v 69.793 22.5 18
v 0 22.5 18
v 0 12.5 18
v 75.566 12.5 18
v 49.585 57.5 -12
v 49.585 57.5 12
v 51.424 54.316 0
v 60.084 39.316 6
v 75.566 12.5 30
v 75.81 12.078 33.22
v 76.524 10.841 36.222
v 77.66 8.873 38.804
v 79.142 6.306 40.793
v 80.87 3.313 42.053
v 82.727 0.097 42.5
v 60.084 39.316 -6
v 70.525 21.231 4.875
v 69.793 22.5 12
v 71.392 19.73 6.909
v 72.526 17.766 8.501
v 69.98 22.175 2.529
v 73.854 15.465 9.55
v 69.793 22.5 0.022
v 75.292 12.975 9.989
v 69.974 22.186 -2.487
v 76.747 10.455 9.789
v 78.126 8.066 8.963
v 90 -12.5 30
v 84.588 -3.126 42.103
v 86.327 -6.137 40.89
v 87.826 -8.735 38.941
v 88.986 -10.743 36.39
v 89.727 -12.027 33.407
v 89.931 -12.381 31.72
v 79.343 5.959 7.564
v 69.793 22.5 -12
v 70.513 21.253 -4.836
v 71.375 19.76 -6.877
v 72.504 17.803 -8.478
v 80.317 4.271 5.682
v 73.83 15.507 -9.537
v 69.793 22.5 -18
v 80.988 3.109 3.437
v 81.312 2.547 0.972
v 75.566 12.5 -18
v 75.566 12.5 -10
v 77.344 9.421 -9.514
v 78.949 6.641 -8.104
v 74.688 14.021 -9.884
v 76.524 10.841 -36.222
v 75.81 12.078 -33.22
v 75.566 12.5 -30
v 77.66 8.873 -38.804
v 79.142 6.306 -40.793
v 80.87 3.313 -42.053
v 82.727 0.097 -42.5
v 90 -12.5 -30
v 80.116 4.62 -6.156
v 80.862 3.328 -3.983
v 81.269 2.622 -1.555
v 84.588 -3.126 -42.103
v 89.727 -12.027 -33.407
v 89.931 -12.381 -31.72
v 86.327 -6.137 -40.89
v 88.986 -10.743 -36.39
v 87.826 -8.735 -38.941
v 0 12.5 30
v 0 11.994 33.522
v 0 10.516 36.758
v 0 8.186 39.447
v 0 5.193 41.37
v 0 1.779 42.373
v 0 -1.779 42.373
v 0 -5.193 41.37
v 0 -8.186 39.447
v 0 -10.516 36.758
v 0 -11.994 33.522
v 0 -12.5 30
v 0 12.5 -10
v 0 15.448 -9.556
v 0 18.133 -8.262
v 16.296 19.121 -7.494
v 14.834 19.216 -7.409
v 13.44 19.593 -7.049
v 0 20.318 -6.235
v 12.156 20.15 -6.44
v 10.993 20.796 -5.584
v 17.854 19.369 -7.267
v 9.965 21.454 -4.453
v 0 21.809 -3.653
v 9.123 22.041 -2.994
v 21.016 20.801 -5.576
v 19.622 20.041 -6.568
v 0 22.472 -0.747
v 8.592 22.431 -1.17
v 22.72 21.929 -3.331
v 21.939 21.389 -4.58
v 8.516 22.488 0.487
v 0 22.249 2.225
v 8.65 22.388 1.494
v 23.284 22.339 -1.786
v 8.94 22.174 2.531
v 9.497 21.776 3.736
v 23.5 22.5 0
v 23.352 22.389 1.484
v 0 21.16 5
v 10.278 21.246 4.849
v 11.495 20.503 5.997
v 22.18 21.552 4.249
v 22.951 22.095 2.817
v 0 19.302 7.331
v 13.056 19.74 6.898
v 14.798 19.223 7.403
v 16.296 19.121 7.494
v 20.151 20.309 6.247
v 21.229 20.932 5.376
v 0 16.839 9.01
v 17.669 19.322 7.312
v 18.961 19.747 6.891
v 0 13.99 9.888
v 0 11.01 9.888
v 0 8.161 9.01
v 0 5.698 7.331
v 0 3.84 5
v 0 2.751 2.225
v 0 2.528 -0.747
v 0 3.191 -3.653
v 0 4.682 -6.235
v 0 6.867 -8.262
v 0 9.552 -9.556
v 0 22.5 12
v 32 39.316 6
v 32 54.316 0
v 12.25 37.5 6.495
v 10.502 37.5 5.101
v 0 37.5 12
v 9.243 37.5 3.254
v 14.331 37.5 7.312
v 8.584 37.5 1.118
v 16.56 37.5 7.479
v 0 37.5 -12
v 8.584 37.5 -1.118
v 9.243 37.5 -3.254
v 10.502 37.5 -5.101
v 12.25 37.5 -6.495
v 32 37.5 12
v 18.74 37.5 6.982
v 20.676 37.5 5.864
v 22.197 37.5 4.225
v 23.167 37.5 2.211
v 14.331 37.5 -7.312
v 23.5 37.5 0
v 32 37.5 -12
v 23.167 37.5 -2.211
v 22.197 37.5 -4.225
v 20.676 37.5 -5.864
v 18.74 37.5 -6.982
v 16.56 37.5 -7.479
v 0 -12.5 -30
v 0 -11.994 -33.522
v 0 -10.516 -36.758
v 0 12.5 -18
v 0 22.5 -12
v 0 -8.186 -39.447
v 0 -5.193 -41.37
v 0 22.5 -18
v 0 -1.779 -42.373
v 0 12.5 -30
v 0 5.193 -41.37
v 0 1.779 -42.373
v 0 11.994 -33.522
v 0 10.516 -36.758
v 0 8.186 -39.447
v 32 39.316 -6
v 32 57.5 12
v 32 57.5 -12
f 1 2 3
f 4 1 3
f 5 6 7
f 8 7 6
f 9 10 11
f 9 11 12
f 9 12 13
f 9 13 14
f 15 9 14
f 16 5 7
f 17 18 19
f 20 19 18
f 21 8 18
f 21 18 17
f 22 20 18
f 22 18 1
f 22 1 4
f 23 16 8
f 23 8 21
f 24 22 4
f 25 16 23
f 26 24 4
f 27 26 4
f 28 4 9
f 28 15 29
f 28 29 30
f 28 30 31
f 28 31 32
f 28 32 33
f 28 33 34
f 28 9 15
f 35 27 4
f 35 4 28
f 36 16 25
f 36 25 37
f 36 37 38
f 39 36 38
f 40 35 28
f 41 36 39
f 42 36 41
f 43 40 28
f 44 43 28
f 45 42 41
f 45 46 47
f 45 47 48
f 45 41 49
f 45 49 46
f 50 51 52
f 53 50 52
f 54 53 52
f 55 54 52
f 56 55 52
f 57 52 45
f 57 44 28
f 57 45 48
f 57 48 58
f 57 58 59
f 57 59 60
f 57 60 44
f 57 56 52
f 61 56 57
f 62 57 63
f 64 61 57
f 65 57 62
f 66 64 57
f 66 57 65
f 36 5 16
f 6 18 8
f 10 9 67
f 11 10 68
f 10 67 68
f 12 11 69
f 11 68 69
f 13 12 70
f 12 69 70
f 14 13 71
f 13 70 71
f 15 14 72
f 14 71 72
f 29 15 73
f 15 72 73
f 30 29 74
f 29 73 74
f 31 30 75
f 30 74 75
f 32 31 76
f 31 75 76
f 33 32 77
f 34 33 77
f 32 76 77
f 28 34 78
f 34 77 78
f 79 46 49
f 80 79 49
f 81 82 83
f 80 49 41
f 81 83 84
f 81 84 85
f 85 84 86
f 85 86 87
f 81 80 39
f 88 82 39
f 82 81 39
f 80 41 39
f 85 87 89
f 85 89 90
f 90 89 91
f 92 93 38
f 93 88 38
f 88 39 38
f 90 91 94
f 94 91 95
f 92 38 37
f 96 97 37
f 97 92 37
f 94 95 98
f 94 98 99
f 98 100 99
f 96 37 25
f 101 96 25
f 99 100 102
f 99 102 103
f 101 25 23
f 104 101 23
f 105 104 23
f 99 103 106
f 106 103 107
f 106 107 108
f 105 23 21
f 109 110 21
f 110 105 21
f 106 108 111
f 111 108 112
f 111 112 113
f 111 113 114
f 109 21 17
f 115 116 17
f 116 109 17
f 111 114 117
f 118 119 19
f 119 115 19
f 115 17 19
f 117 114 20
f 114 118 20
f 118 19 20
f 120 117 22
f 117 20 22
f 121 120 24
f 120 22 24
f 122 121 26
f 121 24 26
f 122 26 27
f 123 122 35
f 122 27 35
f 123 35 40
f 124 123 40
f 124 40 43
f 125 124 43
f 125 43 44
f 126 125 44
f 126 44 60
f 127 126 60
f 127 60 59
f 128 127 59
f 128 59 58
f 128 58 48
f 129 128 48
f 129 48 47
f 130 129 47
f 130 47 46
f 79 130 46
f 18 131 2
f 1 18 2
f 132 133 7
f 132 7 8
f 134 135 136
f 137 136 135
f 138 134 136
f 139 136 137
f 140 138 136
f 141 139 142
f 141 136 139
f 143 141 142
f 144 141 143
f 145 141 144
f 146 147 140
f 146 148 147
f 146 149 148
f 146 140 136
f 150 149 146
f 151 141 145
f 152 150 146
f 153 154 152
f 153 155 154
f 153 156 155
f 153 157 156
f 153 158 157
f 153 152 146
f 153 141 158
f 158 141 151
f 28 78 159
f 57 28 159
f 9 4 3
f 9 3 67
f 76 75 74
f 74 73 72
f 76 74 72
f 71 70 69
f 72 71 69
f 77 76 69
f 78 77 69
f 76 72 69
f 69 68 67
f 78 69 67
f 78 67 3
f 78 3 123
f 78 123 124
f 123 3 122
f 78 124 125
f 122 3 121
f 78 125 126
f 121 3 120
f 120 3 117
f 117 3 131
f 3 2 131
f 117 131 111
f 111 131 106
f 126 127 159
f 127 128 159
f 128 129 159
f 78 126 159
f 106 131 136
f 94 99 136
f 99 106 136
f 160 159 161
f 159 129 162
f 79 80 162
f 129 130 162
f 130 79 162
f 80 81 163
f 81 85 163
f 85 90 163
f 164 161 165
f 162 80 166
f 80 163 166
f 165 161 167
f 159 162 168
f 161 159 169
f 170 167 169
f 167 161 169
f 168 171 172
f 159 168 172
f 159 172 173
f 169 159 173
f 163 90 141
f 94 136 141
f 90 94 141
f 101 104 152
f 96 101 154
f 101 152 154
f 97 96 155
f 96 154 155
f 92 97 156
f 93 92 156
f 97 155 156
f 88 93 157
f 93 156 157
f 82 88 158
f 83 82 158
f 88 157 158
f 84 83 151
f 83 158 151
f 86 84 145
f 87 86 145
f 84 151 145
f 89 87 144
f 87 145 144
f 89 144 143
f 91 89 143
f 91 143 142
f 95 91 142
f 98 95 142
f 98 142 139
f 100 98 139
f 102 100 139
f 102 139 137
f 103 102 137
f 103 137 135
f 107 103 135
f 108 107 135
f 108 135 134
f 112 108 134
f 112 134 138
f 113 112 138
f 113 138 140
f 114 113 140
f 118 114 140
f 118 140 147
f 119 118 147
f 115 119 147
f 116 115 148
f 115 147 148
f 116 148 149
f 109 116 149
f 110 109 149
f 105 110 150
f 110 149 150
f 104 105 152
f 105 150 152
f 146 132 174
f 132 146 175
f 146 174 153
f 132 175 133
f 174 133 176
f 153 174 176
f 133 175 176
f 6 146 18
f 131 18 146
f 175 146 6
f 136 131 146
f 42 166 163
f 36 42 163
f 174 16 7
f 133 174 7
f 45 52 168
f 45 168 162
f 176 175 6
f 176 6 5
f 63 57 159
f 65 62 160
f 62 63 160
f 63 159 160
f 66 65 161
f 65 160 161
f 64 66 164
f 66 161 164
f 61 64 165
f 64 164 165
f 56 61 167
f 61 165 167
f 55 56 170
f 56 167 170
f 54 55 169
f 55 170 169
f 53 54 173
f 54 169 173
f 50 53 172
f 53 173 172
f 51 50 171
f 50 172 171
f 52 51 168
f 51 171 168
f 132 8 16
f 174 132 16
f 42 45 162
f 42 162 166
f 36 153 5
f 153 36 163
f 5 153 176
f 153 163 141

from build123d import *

# Parameters (mm, degrees)
SKETCH3_W               = 24
SKETCH3_H               = 35
BOSS_EXTRUDE1_DEPTH     = 90
SKETCH4_R               = 10
CUT_EXTRUDE1_DEPTH      = 91
SKETCH6_W               = 32
SKETCH6_H               = 24
CUT_EXTRUDE2_DEPTH      = 20
CUT_EXTRUDE4_REACH      = 52
SKETCH7_R               = 7.5
CUT_EXTRUDE5_DEPTH      = 31.5
CUT_EXTRUDE5_DEPTH_BACK = 55.5
CUT_EXTRUDE6_REACH      = 92


with BuildPart() as part:
    # Sketch3 → Boss-Extrude1 (new body)
    with BuildSketch(Plane(origin=(0, 0, 0), x_dir=(0, 0, -1), z_dir=(1, 0, 0))):
        with BuildLine():
            Line((-30, -12.5), (30, -12.5))
            ThreePointArc((30, -12.5), (42.5, 0), (30, 12.5))
            Line((30, 12.5), (-30, 12.5))
            ThreePointArc((-30, 12.5), (-42.5, 0), (-30, -12.5))
        make_face()
        Polygon((-18, 22.5), (-18, 12.5), (18, 12.5), (18, 22.5), (12, 22.5), (-12, 22.5), align=None)
        with Locations((0, 40)):
            Rectangle(SKETCH3_W, SKETCH3_H)
    extrude(amount=BOSS_EXTRUDE1_DEPTH)

    # Sketch4 → Cut-Extrude1 (cut, through all)
    with BuildSketch(Plane(origin=(90, 0, 0), x_dir=(0, 0, -1), z_dir=(1, 0, 0))):
        with Locations((0, 12.5)):
            Circle(SKETCH4_R)
    extrude(amount=-CUT_EXTRUDE1_DEPTH, mode=Mode.SUBTRACT)

    # Sketch6 → Cut-Extrude2 (cut)
    with BuildSketch(Plane(origin=(0, 57.5, 0), x_dir=(1, 0, 0), z_dir=(0, 1, 0))):
        with Locations((16, 0)):
            Rectangle(SKETCH6_W, SKETCH6_H)
    extrude(amount=-CUT_EXTRUDE2_DEPTH, mode=Mode.SUBTRACT)

    # Sketch7 → Cut-Extrude4 (cut, up to next)
    with BuildSketch(Plane(origin=(0, 37.5, 0), x_dir=(1, 0, 0), z_dir=(0, 1, 0)), mode=Mode.PRIVATE) as cut_extrude4_sk1:
        with Locations((16, 0)):
            Circle(SKETCH7_R)
    cut_extrude4_tool1 = extrude(cut_extrude4_sk1.sketch, amount=-CUT_EXTRUDE4_REACH, mode=Mode.PRIVATE) & part.part
    add(cut_extrude4_tool1.solids().sort_by_distance((16, 37.5, 0))[0], mode=Mode.SUBTRACT)

    # Sketch9 → Cut-Extrude5 (cut, two sides)
    with BuildSketch(Plane.XY.offset(12)) as cut_extrude5_sk:
        Polygon((90, 22.5), (90, 57.5), (49.585481157, 57.5), (90, -12.5), (90, 12.5), align=None)
    extrude(amount=CUT_EXTRUDE5_DEPTH, mode=Mode.SUBTRACT)
    extrude(cut_extrude5_sk.sketch, amount=-CUT_EXTRUDE5_DEPTH_BACK, mode=Mode.SUBTRACT)

    # Sketch15 → Cut-Extrude6 (cut, up to next)
    with BuildSketch(Plane(origin=(90, 0, 0), x_dir=(0, 0, -1), z_dir=(1, 0, 0)), mode=Mode.PRIVATE) as cut_extrude6_sk1:
        Polygon((0, 54.316366077), (-6, 39.316366077), (6, 39.316366077), align=None)
    cut_extrude6_tool1 = extrude(cut_extrude6_sk1.sketch, amount=-CUT_EXTRUDE6_REACH, mode=Mode.PRIVATE) & part.part
    add(cut_extrude6_tool1.solids().sort_by_distance((90, 44.316366, 0))[0], mode=Mode.SUBTRACT)


solid = part.part
